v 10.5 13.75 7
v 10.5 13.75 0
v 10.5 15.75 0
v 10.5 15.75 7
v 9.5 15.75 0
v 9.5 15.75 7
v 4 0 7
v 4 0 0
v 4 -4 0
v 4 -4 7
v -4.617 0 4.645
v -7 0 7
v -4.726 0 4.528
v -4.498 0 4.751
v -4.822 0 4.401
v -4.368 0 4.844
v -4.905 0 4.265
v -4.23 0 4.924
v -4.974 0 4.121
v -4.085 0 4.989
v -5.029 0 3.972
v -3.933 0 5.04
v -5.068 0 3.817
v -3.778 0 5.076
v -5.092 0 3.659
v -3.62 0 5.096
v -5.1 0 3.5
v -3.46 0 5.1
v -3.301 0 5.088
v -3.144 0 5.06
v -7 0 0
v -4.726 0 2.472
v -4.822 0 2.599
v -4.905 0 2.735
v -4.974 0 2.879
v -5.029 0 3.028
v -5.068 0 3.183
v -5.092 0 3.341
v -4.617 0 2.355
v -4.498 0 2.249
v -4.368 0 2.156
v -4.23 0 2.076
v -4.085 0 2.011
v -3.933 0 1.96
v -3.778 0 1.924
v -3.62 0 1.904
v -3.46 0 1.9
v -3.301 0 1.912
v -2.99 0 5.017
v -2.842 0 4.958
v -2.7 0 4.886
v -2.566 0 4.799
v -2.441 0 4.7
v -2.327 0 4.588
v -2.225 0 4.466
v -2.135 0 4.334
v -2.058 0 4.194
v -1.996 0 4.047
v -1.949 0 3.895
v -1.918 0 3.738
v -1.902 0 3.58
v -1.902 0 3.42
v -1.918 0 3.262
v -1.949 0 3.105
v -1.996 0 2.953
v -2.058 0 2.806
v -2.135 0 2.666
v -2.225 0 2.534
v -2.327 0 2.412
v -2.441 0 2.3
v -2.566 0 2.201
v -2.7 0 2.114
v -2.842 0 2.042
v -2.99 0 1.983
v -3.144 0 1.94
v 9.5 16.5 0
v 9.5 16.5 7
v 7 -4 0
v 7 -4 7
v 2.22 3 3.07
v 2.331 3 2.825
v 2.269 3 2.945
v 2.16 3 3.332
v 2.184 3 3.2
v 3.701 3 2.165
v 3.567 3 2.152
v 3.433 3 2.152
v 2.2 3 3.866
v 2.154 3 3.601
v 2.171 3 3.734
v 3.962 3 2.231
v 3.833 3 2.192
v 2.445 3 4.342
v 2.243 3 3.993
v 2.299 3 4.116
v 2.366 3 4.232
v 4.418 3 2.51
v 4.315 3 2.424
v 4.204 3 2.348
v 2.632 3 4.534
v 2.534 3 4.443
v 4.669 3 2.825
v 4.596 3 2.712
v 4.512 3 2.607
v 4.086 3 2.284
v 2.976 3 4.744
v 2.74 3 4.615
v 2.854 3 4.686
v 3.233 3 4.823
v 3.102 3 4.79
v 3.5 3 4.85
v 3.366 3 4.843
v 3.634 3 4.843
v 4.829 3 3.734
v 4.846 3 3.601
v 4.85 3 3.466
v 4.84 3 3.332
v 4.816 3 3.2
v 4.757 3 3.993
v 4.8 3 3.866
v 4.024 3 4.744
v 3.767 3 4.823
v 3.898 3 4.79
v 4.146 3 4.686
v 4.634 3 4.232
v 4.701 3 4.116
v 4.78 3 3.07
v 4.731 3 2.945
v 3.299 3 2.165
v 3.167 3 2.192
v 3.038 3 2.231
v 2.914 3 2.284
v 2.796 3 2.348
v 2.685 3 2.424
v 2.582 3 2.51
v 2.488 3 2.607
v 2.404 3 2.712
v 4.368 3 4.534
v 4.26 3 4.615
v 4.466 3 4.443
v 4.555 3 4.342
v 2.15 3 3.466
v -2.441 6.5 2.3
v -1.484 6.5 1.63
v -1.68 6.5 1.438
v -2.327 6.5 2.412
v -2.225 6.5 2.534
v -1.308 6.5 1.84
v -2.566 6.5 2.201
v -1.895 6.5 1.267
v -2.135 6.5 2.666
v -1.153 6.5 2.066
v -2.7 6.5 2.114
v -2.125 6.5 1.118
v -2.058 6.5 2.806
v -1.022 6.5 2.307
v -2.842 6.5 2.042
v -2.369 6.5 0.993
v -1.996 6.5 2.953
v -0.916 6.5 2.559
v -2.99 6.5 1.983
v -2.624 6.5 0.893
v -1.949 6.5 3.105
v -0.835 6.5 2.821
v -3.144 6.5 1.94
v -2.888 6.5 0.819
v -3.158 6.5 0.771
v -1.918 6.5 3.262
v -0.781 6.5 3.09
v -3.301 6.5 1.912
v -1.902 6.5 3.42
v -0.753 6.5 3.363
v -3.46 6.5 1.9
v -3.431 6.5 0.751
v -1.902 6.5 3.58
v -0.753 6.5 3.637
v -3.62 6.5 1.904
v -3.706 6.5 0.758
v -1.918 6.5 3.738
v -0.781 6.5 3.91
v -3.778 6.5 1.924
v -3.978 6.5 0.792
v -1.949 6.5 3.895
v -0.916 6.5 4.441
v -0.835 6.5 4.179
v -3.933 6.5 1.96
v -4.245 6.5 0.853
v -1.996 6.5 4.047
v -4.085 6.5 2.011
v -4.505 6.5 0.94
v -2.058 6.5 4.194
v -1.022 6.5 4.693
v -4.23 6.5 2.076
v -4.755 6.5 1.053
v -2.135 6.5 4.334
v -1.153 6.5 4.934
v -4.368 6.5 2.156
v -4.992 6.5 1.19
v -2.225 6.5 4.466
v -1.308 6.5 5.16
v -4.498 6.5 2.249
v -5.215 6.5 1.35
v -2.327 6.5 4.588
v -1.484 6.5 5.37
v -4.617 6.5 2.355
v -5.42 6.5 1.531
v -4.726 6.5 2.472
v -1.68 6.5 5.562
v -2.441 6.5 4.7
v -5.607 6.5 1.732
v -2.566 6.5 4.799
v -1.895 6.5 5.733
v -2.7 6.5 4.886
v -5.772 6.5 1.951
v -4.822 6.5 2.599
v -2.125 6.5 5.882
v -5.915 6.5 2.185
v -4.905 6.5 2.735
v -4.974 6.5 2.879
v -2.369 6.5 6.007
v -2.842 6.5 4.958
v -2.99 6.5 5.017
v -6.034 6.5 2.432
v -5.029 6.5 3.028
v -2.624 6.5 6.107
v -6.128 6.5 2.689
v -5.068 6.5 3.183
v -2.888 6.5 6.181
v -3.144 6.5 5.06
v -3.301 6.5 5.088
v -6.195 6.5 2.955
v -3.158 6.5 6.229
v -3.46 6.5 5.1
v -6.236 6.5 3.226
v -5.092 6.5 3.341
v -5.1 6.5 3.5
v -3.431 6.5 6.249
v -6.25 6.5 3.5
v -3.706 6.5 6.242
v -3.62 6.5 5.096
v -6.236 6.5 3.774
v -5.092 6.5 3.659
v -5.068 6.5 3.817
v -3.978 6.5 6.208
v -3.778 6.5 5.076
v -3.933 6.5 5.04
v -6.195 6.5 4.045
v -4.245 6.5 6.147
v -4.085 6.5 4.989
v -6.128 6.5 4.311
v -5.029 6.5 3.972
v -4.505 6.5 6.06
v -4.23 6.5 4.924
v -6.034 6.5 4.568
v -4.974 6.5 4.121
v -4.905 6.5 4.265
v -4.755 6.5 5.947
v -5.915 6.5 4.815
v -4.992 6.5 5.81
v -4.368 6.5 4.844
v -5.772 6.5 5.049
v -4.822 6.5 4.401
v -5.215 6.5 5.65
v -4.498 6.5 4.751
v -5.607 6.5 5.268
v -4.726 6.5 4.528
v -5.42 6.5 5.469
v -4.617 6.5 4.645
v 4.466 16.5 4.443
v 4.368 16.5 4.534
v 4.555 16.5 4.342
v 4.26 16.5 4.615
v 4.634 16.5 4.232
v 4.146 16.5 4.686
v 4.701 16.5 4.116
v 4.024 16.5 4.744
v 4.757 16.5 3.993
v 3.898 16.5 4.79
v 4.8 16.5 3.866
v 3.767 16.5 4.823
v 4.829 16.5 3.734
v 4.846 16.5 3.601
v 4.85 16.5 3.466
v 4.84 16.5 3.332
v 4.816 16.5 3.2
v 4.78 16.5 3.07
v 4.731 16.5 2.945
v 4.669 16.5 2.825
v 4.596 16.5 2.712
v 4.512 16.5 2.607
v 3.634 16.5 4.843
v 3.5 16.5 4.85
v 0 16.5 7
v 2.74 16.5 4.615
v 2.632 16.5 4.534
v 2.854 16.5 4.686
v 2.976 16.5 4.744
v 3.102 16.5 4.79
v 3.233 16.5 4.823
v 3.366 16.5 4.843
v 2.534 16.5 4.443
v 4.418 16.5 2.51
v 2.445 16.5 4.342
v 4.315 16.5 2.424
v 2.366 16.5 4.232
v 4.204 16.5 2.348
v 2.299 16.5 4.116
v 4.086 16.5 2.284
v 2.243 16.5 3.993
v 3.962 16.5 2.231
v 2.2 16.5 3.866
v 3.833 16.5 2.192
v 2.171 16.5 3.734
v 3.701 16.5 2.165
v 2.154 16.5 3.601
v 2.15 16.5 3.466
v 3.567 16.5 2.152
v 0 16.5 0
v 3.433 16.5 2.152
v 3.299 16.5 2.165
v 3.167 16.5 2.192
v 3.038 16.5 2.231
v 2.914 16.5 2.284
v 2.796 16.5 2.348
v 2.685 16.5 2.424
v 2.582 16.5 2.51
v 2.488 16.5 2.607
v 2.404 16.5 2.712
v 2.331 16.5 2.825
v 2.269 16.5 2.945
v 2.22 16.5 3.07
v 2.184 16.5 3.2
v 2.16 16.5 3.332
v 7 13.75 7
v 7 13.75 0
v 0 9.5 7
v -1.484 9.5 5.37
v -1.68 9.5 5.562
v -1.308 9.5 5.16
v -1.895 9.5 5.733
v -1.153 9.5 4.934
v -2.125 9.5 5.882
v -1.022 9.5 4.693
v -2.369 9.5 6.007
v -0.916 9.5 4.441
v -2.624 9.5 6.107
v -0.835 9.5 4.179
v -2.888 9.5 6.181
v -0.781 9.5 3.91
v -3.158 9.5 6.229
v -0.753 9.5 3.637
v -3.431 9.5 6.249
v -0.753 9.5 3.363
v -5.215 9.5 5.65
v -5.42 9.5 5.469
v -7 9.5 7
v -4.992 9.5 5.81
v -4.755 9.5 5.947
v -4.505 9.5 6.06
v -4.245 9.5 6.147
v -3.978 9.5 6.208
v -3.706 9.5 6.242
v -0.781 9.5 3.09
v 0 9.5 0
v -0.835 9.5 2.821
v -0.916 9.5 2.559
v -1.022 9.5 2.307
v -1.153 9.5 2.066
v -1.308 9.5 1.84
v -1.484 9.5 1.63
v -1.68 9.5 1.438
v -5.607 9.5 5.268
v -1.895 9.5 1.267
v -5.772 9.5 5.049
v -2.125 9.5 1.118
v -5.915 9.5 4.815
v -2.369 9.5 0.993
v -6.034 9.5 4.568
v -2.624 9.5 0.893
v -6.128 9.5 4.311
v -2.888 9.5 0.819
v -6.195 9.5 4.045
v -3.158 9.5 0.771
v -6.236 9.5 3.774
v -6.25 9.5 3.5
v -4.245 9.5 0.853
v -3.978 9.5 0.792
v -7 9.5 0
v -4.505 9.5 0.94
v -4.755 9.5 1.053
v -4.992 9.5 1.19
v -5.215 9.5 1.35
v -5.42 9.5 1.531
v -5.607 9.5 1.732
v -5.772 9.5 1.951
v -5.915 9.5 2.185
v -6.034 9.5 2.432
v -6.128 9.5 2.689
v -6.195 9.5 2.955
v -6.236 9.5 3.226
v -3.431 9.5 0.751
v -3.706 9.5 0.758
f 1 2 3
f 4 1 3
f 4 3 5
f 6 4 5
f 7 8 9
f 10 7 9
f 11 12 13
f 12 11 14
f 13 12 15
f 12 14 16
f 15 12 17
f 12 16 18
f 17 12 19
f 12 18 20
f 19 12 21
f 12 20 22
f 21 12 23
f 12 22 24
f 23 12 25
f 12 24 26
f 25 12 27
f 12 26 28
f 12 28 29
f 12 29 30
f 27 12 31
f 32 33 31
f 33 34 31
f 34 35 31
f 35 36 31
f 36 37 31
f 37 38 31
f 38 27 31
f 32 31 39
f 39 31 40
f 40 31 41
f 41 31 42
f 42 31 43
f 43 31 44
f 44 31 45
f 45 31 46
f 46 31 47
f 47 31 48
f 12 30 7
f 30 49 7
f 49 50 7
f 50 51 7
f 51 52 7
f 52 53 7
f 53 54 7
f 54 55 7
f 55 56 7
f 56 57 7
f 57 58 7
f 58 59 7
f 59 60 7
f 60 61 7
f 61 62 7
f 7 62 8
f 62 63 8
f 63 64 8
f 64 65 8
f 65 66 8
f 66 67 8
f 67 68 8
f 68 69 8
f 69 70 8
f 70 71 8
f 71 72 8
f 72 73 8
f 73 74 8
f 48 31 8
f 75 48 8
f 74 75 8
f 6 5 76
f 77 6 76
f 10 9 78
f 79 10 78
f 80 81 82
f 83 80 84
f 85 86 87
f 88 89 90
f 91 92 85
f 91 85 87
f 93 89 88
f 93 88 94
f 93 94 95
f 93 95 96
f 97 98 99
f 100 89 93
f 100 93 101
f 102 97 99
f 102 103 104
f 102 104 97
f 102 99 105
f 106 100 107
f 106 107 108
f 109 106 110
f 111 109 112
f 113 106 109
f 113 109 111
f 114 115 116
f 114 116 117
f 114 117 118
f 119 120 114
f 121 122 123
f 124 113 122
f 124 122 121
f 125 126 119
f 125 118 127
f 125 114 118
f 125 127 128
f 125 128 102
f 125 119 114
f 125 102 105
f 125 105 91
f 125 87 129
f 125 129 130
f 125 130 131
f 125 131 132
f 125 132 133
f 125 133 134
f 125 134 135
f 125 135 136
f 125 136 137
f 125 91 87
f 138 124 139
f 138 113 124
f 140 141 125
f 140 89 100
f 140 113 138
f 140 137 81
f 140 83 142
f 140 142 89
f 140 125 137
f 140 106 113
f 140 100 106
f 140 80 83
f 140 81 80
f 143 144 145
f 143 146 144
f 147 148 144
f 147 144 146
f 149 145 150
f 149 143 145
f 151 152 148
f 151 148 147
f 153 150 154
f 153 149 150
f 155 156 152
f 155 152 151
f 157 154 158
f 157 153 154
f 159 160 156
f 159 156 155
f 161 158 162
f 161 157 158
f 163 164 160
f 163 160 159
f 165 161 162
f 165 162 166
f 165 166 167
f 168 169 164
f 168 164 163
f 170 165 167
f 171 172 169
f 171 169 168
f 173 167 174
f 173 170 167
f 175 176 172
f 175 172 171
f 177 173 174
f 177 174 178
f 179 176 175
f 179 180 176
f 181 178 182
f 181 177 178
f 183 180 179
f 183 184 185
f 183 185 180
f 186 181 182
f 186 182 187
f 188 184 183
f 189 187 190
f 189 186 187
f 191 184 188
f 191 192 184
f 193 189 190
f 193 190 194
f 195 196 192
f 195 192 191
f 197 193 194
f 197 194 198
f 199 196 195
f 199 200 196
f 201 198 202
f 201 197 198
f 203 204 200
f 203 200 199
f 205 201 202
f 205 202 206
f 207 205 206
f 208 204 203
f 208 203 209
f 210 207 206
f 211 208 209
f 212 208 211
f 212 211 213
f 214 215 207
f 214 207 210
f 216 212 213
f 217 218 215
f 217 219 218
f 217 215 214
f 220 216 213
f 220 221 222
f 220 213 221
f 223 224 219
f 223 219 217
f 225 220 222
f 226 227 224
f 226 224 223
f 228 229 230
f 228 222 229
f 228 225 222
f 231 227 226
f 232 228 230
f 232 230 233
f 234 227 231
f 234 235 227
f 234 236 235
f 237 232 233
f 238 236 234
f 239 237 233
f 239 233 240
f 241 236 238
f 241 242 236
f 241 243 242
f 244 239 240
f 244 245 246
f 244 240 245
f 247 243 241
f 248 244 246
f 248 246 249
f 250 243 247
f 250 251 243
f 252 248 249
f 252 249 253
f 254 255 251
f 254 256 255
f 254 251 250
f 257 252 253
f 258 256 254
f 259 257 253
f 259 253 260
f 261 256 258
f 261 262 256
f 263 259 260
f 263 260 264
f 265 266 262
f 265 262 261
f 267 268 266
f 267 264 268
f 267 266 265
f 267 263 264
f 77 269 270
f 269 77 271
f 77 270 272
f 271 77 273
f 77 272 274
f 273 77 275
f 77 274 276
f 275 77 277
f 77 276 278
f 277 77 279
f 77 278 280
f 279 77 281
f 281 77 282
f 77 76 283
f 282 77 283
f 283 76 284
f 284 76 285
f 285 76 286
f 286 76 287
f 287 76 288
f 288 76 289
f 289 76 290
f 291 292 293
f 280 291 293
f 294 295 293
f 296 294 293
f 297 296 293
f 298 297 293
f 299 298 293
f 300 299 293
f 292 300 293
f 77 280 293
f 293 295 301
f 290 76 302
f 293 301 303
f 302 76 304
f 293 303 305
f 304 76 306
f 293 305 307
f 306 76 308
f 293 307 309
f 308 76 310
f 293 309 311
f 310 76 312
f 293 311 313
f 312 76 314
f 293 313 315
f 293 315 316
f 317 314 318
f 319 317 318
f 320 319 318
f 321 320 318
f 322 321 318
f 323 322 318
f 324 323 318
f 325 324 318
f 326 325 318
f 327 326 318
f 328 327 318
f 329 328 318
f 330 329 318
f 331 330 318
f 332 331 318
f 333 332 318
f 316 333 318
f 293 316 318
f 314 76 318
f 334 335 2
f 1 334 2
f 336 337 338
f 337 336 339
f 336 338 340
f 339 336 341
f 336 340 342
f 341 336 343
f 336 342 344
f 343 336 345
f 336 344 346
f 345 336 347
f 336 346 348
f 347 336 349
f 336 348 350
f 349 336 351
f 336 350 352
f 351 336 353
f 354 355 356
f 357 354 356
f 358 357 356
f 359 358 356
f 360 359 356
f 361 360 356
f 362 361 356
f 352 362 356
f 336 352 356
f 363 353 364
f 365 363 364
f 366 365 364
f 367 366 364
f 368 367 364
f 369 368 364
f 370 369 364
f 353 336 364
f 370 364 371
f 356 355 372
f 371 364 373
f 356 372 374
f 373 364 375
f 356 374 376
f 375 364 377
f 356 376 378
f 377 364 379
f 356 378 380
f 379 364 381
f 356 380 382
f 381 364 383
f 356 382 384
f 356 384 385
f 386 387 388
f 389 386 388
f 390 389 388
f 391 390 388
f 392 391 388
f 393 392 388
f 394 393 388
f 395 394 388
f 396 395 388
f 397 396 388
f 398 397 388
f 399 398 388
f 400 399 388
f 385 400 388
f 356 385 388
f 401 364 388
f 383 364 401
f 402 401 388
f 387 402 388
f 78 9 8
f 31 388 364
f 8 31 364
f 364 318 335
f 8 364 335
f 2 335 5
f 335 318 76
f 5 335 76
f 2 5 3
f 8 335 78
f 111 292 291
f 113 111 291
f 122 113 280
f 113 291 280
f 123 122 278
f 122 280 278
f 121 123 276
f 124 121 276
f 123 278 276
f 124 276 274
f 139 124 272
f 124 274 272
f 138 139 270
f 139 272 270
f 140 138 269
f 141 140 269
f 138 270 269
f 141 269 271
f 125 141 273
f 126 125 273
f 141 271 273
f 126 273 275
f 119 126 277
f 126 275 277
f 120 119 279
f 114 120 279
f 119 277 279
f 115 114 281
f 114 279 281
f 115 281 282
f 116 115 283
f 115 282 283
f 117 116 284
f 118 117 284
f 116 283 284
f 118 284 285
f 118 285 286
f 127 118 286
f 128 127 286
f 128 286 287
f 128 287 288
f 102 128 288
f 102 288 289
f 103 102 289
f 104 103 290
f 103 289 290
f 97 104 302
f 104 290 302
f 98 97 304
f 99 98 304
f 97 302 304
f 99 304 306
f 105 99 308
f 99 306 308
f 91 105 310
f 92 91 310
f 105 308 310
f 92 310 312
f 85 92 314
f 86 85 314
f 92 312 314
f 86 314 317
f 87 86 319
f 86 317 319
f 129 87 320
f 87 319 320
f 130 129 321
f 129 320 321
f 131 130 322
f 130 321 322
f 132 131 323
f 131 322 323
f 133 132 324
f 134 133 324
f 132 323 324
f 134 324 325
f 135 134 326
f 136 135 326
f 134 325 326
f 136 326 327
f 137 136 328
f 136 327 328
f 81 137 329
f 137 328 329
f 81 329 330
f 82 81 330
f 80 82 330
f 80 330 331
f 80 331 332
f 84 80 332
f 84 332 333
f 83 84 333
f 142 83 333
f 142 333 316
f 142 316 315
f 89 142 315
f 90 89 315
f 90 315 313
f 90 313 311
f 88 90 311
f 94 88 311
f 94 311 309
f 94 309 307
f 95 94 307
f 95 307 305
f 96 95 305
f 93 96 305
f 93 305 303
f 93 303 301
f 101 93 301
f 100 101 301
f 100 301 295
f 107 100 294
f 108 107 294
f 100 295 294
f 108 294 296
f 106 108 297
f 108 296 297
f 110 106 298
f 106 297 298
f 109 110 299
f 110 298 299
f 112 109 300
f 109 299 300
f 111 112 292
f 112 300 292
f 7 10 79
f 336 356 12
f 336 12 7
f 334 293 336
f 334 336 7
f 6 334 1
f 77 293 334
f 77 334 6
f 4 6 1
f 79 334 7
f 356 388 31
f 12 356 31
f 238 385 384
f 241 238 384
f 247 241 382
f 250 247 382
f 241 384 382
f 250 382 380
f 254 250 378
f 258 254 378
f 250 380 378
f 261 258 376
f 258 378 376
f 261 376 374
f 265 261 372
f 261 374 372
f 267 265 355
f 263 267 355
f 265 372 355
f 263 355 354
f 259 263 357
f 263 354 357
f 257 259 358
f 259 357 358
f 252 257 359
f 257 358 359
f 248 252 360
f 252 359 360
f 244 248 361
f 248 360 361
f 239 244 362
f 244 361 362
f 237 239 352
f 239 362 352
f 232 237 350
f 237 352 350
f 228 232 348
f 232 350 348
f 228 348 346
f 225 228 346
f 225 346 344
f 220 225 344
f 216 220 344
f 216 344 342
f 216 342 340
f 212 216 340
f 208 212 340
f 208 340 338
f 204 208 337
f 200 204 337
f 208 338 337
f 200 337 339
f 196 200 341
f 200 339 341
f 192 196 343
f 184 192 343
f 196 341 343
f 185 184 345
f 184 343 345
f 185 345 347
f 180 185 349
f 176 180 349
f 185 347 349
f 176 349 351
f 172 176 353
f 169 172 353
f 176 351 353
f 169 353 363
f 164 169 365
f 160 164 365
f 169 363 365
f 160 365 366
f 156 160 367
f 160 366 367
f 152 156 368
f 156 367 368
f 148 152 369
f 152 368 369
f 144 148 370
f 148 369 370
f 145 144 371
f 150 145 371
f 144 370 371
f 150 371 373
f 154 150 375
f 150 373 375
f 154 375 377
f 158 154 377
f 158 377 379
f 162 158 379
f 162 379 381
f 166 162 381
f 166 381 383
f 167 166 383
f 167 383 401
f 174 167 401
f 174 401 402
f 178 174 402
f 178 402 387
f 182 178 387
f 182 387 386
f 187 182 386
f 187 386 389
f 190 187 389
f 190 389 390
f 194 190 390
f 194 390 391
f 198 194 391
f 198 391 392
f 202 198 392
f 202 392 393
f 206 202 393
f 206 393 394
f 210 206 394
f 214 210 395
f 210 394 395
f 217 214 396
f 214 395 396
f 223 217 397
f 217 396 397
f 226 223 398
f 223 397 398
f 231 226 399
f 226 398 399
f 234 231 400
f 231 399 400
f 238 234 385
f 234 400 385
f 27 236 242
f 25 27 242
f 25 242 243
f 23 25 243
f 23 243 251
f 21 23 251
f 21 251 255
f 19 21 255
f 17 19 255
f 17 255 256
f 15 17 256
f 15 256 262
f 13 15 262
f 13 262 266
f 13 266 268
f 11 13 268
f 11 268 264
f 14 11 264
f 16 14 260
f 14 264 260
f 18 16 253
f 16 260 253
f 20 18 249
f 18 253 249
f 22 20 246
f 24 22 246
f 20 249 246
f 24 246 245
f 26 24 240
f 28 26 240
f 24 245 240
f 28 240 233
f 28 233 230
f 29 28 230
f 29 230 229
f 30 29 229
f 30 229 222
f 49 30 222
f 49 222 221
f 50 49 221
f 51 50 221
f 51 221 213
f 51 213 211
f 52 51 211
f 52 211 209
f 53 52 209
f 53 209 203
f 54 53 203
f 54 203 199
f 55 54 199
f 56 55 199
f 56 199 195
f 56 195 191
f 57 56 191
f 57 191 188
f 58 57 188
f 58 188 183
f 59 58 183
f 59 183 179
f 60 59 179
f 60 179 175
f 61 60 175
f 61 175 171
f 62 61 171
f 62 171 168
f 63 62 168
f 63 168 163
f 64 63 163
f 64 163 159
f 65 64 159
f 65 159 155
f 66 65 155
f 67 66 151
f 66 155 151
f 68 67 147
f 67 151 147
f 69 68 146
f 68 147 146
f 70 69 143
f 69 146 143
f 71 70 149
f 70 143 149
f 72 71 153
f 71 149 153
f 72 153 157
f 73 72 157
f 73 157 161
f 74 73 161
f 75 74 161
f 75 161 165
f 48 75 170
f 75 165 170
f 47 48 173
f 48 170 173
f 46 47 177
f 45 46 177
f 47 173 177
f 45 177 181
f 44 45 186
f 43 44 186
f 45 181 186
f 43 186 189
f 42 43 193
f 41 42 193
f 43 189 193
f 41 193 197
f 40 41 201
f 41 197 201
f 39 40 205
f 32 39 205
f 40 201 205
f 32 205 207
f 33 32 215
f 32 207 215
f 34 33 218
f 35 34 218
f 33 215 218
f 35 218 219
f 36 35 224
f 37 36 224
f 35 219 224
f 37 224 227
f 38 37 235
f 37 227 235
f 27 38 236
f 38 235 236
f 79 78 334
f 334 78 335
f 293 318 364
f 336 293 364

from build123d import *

# Parameters (mm, degrees)
SALIENTE_EXTRUIR1_DEPTH = 7
CROQUIS4_R              = 1.35
CORTAR_EXTRUIR1_DEPTH   = 13.5
CROQUIS5_R              = 1.6
CORTAR_EXTRUIR2_DEPTH   = 13.9
CROQUIS6_R              = 2.75
CORTAR_EXTRUIR3_DEPTH   = 3


with BuildPart() as part:
    # Croquis1 → Saliente-Extruir1 (new body)
    with BuildSketch(Plane.XY):
        Polygon((0, 0), (4, 0), (4, -4), (7, -4), (7, 0), (7, 13.75), (10.5, 13.75), (10.5, 15.75), (9.5, 15.75), (9.5, 16.5), (7, 16.5), (0, 16.5), (0, 9.5), (-7, 9.5), (-7, 0), align=None)
    extrude(amount=SALIENTE_EXTRUIR1_DEPTH)

    # Croquis4 → Cortar-Extruir1 (cut)
    with BuildSketch(Plane(origin=(0, 16.5, 0), x_dir=(1, 0, 0), z_dir=(0, 1, 0))):
        with Locations(Location((3.5, -3.5, 0), (0, 0, 270))):
            Circle(CROQUIS4_R)
    extrude(amount=-CORTAR_EXTRUIR1_DEPTH, mode=Mode.SUBTRACT)

    # Croquis5 → Cortar-Extruir2 (cut)
    with BuildSketch(Plane(origin=(0, 9.5, 0), x_dir=(1, 0, 0), z_dir=(0, 1, 0))):
        with Locations(Location((-3.5, -3.5, 0), (0, 0, 180))):
            Circle(CROQUIS5_R)
    extrude(amount=-CORTAR_EXTRUIR2_DEPTH, mode=Mode.SUBTRACT)

    # Croquis6 → Cortar-Extruir3 (cut)
    with BuildSketch(Plane(origin=(0, 9.5, 0), x_dir=(1, 0, 0), z_dir=(0, 1, 0))):
        with Locations(Location((-3.5, -3.5, 0), (0, 0, 180))):
            Circle(CROQUIS6_R)
    extrude(amount=-CORTAR_EXTRUIR3_DEPTH, mode=Mode.SUBTRACT)


solid = part.part
